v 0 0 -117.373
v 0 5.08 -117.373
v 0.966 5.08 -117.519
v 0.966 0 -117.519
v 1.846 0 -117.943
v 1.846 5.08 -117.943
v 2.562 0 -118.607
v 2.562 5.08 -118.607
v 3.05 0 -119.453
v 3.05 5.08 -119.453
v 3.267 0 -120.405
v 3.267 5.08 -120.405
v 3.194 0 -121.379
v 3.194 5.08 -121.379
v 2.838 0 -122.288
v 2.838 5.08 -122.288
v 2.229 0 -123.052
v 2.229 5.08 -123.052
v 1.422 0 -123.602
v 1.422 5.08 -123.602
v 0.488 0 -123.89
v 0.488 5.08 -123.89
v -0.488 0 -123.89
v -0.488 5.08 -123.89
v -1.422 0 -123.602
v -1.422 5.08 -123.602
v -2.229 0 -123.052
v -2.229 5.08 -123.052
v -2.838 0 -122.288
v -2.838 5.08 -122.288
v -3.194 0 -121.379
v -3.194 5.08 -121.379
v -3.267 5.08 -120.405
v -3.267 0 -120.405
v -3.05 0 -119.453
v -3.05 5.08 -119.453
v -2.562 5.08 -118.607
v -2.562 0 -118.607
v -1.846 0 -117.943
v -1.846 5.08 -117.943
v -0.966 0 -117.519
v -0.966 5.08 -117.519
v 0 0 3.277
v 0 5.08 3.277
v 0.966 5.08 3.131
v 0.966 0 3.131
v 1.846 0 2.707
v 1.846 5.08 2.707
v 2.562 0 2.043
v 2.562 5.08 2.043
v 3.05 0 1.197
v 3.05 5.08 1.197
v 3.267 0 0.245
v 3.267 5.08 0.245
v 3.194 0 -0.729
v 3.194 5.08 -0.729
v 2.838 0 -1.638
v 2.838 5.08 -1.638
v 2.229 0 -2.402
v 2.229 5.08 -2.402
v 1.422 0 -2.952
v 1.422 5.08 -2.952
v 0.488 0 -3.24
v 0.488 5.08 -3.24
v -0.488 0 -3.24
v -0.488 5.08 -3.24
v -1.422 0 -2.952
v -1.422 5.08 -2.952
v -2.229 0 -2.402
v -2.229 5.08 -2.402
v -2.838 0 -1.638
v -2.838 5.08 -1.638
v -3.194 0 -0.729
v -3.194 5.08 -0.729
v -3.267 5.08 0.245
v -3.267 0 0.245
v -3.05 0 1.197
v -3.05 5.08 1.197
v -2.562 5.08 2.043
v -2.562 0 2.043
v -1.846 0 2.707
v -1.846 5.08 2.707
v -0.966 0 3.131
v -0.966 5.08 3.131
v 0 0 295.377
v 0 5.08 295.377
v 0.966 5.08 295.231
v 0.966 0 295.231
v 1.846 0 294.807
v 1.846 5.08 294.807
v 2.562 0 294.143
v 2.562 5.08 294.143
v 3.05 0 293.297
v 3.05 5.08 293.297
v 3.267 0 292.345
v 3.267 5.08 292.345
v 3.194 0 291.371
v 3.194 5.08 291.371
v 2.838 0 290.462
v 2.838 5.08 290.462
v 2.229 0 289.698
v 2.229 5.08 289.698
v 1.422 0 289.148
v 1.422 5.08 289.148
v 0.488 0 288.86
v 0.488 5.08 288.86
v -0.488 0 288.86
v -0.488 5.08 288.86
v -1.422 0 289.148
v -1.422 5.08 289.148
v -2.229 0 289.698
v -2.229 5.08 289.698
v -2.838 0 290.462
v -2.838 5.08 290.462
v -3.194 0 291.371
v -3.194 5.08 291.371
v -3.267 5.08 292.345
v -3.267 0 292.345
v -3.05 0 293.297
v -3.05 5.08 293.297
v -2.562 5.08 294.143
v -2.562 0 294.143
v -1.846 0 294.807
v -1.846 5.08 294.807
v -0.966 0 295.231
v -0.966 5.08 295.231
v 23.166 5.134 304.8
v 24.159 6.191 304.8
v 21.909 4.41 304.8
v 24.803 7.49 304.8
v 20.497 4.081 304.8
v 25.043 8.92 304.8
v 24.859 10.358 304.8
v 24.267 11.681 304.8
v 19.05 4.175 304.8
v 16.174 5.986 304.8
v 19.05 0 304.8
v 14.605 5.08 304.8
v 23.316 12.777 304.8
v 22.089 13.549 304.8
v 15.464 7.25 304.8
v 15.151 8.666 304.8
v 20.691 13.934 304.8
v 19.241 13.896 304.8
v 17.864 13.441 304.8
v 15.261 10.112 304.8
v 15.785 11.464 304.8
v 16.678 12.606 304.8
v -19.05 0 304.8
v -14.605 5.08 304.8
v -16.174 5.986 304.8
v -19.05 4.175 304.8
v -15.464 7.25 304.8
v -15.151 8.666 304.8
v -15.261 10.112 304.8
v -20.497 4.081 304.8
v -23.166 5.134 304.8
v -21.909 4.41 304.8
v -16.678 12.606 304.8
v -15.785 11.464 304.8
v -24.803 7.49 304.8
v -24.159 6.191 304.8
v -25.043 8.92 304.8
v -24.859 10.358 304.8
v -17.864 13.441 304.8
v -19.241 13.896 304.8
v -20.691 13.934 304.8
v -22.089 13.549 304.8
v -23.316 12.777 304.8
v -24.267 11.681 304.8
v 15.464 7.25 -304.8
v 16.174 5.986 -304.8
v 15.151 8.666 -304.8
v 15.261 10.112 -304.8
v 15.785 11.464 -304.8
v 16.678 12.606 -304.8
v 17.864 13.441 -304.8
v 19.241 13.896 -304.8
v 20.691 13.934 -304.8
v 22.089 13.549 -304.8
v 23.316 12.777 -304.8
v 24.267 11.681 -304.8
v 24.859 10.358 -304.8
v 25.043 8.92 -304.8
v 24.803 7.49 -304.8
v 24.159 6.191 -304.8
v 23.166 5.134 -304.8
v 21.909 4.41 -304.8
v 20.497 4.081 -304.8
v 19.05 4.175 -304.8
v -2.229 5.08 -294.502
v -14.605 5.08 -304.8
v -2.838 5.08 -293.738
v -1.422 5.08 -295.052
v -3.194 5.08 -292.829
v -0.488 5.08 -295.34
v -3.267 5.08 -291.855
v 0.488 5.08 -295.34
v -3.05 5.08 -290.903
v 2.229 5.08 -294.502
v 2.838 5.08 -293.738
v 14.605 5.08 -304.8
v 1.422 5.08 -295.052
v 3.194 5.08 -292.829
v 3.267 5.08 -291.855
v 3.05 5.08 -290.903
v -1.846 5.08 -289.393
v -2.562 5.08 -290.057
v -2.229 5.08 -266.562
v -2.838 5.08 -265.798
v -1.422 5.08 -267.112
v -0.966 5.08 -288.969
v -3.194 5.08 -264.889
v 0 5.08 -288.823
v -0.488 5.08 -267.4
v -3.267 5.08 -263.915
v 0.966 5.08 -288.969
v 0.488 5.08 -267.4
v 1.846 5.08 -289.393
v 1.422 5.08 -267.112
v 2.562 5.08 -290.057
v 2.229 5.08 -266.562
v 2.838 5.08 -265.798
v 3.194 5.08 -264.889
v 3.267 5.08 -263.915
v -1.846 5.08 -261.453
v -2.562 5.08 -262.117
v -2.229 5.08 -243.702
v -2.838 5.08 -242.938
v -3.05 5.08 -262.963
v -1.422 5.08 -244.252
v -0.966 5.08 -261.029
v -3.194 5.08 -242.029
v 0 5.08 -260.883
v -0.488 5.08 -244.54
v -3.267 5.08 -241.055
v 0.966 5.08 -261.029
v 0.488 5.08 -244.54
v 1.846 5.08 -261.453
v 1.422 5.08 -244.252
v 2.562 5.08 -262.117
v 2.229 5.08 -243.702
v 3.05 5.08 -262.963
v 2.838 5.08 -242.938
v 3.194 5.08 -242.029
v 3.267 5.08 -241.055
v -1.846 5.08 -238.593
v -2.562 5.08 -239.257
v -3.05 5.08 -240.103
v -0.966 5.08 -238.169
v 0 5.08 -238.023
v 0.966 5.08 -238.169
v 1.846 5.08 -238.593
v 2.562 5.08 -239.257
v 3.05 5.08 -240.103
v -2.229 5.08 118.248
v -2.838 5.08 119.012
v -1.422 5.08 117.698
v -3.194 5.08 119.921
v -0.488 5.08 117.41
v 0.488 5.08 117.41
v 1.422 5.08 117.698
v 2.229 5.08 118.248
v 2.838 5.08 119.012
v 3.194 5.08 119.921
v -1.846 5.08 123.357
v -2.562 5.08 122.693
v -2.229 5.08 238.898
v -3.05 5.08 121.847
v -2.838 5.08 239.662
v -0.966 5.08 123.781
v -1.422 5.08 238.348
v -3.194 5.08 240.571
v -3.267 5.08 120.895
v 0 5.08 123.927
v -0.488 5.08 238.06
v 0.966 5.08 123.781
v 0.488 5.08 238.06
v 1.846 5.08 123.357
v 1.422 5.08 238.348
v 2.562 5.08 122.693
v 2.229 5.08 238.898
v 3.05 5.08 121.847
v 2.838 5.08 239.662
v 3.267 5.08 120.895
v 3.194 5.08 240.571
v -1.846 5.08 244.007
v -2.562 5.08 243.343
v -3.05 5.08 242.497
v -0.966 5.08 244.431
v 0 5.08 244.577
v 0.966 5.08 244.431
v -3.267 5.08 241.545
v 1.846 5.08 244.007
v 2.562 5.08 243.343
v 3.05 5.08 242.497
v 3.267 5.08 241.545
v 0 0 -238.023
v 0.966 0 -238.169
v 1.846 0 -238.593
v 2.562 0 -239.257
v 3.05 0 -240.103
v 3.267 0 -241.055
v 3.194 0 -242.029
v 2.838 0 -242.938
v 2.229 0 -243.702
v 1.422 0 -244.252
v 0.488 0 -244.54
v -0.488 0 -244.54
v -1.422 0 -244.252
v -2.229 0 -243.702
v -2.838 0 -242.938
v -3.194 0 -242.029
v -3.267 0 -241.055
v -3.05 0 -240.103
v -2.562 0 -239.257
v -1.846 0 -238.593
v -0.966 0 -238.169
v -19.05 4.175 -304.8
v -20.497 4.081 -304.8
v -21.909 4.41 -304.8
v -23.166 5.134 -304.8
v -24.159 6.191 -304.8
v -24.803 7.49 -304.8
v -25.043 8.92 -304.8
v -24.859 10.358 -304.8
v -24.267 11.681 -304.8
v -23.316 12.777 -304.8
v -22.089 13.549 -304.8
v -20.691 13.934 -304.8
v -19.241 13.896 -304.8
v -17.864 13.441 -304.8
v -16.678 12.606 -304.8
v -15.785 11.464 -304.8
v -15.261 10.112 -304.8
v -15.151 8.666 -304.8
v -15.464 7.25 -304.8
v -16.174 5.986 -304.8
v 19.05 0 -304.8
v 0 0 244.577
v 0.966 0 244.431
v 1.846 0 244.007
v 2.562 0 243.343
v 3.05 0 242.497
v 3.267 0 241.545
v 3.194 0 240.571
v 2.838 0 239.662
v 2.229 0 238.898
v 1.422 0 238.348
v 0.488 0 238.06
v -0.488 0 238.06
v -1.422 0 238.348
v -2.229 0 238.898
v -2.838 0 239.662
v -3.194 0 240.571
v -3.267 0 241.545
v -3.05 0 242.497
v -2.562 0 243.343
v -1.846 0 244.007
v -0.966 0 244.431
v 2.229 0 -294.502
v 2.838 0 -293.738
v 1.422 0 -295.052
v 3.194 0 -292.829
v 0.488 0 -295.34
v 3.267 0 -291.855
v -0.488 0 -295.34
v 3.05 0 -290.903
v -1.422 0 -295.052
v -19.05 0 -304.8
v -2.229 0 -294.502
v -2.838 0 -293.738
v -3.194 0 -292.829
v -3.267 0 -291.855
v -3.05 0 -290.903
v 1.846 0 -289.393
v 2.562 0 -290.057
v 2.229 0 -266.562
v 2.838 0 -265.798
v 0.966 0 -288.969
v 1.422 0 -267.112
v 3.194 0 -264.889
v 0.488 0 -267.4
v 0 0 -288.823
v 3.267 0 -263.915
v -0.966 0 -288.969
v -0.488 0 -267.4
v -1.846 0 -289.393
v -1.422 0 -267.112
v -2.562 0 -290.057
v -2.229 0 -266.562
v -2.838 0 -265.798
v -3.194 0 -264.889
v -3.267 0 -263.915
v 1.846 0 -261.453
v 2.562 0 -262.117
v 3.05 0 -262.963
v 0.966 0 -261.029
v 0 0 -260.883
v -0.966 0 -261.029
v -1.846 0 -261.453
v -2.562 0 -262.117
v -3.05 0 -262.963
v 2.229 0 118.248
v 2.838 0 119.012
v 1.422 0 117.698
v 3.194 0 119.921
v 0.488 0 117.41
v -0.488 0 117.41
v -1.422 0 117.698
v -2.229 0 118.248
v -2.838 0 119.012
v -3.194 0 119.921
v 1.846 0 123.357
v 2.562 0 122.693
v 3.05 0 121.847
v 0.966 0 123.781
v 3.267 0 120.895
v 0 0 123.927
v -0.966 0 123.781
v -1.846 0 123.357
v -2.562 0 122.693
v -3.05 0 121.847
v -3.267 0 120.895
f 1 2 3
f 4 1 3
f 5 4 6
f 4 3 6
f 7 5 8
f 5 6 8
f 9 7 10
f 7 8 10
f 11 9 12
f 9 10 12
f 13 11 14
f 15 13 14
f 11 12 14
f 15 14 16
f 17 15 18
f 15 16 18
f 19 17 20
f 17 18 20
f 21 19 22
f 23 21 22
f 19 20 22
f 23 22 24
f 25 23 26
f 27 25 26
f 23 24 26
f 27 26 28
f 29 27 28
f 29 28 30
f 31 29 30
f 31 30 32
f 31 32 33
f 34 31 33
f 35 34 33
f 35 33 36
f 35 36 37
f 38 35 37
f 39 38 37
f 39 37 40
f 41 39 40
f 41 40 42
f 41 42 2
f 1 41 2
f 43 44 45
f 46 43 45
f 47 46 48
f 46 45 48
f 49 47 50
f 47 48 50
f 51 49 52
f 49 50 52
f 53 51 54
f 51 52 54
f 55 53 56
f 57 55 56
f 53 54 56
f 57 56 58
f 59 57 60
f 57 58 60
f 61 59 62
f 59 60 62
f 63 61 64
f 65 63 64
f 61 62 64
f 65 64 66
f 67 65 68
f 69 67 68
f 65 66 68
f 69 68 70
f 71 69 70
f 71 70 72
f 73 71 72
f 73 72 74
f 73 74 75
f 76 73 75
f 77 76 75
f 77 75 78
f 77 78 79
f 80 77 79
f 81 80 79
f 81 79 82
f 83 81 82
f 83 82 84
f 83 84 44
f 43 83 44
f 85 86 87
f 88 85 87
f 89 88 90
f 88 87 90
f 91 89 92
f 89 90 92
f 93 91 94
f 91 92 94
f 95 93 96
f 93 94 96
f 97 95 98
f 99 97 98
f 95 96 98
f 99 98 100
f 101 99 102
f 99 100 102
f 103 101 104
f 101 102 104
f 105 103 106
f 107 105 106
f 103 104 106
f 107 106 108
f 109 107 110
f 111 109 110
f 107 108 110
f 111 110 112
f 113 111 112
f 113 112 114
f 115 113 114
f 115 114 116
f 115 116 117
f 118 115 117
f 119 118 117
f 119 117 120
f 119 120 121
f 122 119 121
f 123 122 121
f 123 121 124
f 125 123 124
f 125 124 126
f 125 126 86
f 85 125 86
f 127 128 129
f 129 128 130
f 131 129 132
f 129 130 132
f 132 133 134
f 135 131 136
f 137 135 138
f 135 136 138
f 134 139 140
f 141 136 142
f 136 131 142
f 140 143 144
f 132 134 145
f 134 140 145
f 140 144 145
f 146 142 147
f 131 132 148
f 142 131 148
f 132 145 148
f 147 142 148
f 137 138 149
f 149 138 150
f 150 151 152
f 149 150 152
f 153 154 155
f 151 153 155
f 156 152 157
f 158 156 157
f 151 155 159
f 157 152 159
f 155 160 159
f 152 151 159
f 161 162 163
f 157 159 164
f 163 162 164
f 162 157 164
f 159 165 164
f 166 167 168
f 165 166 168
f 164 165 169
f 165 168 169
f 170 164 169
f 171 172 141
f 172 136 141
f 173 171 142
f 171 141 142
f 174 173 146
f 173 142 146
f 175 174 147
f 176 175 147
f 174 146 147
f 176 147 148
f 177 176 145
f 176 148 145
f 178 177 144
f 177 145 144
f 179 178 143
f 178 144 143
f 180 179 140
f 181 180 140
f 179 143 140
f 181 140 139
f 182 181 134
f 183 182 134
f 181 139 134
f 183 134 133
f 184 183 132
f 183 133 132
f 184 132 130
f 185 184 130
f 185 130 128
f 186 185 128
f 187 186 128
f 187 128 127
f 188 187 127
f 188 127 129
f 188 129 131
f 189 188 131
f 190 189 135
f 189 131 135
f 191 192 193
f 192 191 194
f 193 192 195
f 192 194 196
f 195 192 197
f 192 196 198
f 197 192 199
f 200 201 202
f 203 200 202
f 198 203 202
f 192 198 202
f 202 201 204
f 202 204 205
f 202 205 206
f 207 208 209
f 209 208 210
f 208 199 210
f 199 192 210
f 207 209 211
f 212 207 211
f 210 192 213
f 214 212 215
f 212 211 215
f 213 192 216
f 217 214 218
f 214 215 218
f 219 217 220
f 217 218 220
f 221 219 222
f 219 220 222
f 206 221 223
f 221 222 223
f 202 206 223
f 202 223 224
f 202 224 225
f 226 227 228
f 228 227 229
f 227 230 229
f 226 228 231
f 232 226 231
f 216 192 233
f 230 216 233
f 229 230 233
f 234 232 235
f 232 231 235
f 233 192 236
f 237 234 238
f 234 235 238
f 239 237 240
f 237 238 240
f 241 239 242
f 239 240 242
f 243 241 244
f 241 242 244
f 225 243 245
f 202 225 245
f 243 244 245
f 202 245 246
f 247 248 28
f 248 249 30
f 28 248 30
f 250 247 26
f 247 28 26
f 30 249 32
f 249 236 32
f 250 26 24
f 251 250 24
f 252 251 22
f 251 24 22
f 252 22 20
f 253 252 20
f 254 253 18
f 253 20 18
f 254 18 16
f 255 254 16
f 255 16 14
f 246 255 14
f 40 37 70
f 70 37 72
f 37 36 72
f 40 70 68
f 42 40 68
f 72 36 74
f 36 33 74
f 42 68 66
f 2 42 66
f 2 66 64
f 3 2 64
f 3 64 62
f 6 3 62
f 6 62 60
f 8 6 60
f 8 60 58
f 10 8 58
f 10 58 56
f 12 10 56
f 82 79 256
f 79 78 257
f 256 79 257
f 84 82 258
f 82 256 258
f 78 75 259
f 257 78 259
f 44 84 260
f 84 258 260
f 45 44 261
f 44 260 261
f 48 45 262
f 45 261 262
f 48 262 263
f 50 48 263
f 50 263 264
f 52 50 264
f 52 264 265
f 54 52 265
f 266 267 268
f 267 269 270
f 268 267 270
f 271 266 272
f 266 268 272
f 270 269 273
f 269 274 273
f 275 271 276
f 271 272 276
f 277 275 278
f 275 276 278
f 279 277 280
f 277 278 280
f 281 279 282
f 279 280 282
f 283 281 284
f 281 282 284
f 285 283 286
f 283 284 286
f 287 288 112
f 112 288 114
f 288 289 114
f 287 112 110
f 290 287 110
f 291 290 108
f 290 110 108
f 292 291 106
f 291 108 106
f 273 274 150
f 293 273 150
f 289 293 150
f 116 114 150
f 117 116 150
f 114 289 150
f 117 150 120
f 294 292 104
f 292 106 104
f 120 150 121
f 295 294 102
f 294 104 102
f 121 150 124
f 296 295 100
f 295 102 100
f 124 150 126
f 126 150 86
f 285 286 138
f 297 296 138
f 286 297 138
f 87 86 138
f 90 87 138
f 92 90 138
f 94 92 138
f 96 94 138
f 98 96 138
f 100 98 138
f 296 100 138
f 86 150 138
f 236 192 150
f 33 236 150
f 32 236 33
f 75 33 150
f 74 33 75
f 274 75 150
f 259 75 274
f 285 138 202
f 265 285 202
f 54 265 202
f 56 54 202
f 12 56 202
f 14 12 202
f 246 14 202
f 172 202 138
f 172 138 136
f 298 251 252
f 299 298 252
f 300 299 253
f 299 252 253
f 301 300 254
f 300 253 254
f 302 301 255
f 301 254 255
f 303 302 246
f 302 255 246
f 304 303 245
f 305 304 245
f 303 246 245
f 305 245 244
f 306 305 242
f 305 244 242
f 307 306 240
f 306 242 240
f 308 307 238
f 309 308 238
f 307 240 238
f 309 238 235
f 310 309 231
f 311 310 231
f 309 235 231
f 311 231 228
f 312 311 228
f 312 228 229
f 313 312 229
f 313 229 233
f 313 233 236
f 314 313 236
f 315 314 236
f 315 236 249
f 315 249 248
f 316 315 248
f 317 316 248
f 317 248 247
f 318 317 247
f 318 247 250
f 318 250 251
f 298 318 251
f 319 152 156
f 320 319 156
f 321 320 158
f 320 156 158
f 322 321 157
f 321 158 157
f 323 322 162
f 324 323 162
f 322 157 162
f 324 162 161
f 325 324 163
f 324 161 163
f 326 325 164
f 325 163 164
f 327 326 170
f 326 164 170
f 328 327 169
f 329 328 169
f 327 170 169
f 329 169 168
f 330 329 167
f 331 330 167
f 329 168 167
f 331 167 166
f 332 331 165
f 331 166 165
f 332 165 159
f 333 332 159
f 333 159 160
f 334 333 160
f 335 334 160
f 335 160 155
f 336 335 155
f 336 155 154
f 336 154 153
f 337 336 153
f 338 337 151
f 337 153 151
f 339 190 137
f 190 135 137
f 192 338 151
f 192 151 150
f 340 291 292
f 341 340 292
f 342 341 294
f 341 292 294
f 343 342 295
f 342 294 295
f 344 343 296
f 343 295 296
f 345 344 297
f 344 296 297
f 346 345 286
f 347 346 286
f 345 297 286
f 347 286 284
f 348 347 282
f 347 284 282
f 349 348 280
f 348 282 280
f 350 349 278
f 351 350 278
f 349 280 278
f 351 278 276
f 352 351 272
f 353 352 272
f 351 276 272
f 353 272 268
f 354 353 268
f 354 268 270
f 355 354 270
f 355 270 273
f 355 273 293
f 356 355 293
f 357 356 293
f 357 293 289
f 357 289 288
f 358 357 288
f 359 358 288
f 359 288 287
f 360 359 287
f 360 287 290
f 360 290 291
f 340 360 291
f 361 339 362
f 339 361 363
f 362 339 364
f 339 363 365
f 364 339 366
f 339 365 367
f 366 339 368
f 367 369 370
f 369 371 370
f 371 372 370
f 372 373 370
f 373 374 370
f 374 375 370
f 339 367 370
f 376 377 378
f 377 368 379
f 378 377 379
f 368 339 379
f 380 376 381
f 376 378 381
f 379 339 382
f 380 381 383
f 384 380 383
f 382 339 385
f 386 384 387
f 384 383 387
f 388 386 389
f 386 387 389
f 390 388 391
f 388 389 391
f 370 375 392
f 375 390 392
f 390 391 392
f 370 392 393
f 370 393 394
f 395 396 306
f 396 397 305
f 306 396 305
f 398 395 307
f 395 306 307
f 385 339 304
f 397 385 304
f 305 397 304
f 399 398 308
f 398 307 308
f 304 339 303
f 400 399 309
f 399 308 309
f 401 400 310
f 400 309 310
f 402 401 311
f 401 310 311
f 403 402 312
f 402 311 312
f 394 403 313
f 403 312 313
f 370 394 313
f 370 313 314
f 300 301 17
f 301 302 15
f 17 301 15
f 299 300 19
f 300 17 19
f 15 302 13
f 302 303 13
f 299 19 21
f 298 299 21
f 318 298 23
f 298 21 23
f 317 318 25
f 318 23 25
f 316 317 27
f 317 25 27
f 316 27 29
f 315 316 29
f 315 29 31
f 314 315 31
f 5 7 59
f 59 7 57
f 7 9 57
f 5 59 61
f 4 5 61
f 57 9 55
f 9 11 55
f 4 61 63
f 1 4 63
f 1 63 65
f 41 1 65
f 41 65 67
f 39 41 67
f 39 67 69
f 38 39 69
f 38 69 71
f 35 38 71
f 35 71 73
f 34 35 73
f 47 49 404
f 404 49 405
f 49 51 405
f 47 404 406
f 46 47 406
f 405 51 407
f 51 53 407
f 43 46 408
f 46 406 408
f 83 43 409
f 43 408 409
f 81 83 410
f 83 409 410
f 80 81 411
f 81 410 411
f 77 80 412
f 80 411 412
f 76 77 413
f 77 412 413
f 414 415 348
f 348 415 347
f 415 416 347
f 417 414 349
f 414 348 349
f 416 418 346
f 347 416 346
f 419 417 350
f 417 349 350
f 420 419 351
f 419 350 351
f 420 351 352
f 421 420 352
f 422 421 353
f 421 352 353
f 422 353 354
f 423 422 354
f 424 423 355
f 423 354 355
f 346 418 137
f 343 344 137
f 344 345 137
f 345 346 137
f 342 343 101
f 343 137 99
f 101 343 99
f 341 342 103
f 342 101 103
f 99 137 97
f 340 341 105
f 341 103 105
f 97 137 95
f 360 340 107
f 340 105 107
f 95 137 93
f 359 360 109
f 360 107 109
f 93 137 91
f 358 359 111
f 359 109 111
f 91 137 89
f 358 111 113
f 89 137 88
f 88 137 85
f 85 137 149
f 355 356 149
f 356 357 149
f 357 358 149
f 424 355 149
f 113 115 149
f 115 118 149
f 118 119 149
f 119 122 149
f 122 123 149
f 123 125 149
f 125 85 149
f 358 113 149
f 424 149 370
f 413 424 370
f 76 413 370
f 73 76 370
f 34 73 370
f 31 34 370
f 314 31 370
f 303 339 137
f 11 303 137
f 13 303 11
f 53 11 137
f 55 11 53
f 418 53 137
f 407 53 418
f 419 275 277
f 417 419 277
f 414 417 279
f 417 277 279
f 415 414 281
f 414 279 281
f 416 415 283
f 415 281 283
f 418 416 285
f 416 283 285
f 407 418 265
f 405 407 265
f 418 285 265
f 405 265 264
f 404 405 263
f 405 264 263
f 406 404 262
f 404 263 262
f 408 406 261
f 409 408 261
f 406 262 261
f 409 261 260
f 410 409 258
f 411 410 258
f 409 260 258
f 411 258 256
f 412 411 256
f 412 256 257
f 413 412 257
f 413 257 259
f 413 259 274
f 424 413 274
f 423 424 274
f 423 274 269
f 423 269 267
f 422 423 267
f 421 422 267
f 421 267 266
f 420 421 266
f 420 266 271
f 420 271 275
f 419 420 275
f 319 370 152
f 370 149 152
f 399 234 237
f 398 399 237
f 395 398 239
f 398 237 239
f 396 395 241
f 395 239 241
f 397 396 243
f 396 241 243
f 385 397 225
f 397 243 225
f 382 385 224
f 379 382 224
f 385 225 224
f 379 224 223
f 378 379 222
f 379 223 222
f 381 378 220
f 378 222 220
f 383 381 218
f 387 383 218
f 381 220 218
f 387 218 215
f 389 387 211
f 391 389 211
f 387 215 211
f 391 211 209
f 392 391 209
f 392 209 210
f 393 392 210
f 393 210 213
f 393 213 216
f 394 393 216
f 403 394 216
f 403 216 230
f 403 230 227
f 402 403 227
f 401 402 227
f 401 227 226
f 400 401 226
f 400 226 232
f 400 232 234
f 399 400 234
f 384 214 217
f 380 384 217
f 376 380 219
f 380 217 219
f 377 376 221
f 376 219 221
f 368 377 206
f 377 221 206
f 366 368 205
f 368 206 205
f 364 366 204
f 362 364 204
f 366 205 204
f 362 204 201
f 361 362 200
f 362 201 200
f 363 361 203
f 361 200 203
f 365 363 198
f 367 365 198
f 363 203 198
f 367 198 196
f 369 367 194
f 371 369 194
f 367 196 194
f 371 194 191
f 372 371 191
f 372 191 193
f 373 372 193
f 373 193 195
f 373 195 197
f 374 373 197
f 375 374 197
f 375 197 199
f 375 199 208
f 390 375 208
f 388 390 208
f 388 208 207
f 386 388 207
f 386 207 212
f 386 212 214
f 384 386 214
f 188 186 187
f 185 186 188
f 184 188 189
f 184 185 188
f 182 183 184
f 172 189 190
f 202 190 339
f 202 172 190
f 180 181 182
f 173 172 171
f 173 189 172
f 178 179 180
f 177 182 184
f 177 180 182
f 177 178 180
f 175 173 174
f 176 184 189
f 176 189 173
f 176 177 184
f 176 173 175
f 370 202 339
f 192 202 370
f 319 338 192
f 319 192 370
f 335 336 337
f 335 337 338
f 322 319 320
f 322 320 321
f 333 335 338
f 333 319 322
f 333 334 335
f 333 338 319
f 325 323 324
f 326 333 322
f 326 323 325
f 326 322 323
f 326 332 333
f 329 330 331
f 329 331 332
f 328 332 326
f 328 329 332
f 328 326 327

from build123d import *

# Parameters (mm, degrees)
BOSS_EXTRUDE1_DEPTH = 304.8
SKETCH2_R           = 3.2766
CUT_EXTRUDE2_DEPTH  = 306.95635975
SKETCH4_R           = 3.2766
CUT_EXTRUDE4_DEPTH  = 25.4
SKETCH5_R           = 3.2766
CUT_EXTRUDE5_DEPTH  = 25.4
SKETCH6_R           = 3.2766
CUT_EXTRUDE8_DEPTH  = 25.4


with BuildPart() as part:
    # Sketch1 → Boss-Extrude1 (new, symmetric)
    with BuildSketch(Plane.XY):
        with BuildLine():
            Line((-14.605, 5.08), (14.605, 5.08))
            Line((14.605, 5.08), (16.174141854, 5.985944472))
            ThreePointArc((16.174141854, 5.985944472), (22.730946929, 13.208062038), (19.05, 4.174717993))
            Line((19.05, 4.174717993), (19.05, 0))
            Line((19.05, 0), (-19.05, 0))
            Line((-19.05, 0), (-19.05, 4.174717993))
            ThreePointArc((-19.05, 4.174717993), (-22.730946929, 13.208062038), (-16.174141854, 5.985944472))
            Line((-16.174141854, 5.985944472), (-14.605, 5.08))
        make_face()
    extrude(amount=BOSS_EXTRUDE1_DEPTH, both=True)

    # Sketch2 → Cut-Extrude2 (cut, through all)
    with BuildSketch(Plane(origin=(0, 5.08, 0), x_dir=(1, 0, 0), z_dir=(0, 1, 0))):
        with Locations(Location((0, -292.1, 0), (0, 0, 270))):
            Circle(SKETCH2_R)
    extrude(amount=-CUT_EXTRUDE2_DEPTH, mode=Mode.SUBTRACT)

    # Sketch4 → Cut-Extrude4 (cut)
    with BuildSketch(Plane(origin=(0, 5.08, 0), x_dir=(1, 0, 0), z_dir=(0, 1, 0))):
        with Locations(Location((0, -241.3, 0), (0, 0, 270))):
            Circle(SKETCH4_R)
        with Locations(Location((0, -120.65, 0), (0, 0, 270))):
            Circle(SKETCH4_R)
        with Locations(Location((0, 0, 0), (0, 0, 270))):
            Circle(SKETCH4_R)
        with Locations(Location((0, 120.65, 0), (0, 0, 270))):
            Circle(SKETCH4_R)
        with Locations(Location((0, 241.3, 0), (0, 0, 270))):
            Circle(SKETCH4_R)
    extrude(amount=-CUT_EXTRUDE4_DEPTH, mode=Mode.SUBTRACT)

    # Sketch5 → Cut-Extrude5 (cut)
    with BuildSketch(Plane(origin=(0, 5.08, 0), x_dir=(1, 0, 0), z_dir=(0, 1, 0))):
        with Locations(Location((0, 292.1, 0), (0, 0, 270))):
            Circle(SKETCH5_R)
    extrude(amount=-CUT_EXTRUDE5_DEPTH, mode=Mode.SUBTRACT)

    # Sketch6 → Cut-Extrude8 (cut)
    with BuildSketch(Plane(origin=(0, 5.08, 0), x_dir=(1, 0, 0), z_dir=(0, 1, 0))):
        with Locations(Location((0, 264.16, 0), (0, 0, 270))):
            Circle(SKETCH6_R)
    extrude(amount=-CUT_EXTRUDE8_DEPTH, mode=Mode.SUBTRACT)


solid = part.part
